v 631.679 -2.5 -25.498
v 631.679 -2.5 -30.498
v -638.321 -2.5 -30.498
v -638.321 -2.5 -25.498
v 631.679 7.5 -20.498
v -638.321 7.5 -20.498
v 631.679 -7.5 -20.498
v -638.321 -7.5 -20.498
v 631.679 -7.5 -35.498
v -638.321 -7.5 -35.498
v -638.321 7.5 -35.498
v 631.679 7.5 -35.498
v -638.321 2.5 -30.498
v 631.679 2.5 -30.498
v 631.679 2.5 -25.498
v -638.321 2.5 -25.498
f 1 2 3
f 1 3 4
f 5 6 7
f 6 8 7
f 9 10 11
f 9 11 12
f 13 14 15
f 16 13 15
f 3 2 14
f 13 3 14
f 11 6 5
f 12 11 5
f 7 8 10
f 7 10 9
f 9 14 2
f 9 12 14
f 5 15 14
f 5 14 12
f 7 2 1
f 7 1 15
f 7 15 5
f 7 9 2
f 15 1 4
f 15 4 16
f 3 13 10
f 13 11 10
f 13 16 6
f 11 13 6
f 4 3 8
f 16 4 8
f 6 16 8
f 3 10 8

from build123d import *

# Parameters (mm, degrees)
F0_W     = 1270
F0_H     = 15
F1_DEPTH = 7.5
F2_W     = 5
F2_H     = 5
F3_DEPTH = 190.5
F4_DEPTH = 1270


with BuildPart() as f1:
    # F0 (on Front) → F1 (new body, symmetric)
    with BuildSketch(Plane.XZ):
        with Locations((-3.320781514, -27.9977901512)):
            Rectangle(F0_W, F0_H)
    extrude(amount=F1_DEPTH, both=True)

    # F2 (on face) → F3 (cut, symmetric)
    with BuildSketch(Plane.YZ.offset(631.679218486)):
        with Locations((0, -27.9977901512)):
            Rectangle(F2_W, F2_H)
    extrude(amount=F3_DEPTH, both=True, mode=Mode.SUBTRACT)

    # F4 (cut): a face of the model
    f4_faces = [f1.faces().sort_by_distance(p)[0] for p in [
        (441.179218486, 0, -27.9977901512),
    ]]
    extrude(f4_faces, amount=-F4_DEPTH, mode=Mode.SUBTRACT)


solid = f1.part
